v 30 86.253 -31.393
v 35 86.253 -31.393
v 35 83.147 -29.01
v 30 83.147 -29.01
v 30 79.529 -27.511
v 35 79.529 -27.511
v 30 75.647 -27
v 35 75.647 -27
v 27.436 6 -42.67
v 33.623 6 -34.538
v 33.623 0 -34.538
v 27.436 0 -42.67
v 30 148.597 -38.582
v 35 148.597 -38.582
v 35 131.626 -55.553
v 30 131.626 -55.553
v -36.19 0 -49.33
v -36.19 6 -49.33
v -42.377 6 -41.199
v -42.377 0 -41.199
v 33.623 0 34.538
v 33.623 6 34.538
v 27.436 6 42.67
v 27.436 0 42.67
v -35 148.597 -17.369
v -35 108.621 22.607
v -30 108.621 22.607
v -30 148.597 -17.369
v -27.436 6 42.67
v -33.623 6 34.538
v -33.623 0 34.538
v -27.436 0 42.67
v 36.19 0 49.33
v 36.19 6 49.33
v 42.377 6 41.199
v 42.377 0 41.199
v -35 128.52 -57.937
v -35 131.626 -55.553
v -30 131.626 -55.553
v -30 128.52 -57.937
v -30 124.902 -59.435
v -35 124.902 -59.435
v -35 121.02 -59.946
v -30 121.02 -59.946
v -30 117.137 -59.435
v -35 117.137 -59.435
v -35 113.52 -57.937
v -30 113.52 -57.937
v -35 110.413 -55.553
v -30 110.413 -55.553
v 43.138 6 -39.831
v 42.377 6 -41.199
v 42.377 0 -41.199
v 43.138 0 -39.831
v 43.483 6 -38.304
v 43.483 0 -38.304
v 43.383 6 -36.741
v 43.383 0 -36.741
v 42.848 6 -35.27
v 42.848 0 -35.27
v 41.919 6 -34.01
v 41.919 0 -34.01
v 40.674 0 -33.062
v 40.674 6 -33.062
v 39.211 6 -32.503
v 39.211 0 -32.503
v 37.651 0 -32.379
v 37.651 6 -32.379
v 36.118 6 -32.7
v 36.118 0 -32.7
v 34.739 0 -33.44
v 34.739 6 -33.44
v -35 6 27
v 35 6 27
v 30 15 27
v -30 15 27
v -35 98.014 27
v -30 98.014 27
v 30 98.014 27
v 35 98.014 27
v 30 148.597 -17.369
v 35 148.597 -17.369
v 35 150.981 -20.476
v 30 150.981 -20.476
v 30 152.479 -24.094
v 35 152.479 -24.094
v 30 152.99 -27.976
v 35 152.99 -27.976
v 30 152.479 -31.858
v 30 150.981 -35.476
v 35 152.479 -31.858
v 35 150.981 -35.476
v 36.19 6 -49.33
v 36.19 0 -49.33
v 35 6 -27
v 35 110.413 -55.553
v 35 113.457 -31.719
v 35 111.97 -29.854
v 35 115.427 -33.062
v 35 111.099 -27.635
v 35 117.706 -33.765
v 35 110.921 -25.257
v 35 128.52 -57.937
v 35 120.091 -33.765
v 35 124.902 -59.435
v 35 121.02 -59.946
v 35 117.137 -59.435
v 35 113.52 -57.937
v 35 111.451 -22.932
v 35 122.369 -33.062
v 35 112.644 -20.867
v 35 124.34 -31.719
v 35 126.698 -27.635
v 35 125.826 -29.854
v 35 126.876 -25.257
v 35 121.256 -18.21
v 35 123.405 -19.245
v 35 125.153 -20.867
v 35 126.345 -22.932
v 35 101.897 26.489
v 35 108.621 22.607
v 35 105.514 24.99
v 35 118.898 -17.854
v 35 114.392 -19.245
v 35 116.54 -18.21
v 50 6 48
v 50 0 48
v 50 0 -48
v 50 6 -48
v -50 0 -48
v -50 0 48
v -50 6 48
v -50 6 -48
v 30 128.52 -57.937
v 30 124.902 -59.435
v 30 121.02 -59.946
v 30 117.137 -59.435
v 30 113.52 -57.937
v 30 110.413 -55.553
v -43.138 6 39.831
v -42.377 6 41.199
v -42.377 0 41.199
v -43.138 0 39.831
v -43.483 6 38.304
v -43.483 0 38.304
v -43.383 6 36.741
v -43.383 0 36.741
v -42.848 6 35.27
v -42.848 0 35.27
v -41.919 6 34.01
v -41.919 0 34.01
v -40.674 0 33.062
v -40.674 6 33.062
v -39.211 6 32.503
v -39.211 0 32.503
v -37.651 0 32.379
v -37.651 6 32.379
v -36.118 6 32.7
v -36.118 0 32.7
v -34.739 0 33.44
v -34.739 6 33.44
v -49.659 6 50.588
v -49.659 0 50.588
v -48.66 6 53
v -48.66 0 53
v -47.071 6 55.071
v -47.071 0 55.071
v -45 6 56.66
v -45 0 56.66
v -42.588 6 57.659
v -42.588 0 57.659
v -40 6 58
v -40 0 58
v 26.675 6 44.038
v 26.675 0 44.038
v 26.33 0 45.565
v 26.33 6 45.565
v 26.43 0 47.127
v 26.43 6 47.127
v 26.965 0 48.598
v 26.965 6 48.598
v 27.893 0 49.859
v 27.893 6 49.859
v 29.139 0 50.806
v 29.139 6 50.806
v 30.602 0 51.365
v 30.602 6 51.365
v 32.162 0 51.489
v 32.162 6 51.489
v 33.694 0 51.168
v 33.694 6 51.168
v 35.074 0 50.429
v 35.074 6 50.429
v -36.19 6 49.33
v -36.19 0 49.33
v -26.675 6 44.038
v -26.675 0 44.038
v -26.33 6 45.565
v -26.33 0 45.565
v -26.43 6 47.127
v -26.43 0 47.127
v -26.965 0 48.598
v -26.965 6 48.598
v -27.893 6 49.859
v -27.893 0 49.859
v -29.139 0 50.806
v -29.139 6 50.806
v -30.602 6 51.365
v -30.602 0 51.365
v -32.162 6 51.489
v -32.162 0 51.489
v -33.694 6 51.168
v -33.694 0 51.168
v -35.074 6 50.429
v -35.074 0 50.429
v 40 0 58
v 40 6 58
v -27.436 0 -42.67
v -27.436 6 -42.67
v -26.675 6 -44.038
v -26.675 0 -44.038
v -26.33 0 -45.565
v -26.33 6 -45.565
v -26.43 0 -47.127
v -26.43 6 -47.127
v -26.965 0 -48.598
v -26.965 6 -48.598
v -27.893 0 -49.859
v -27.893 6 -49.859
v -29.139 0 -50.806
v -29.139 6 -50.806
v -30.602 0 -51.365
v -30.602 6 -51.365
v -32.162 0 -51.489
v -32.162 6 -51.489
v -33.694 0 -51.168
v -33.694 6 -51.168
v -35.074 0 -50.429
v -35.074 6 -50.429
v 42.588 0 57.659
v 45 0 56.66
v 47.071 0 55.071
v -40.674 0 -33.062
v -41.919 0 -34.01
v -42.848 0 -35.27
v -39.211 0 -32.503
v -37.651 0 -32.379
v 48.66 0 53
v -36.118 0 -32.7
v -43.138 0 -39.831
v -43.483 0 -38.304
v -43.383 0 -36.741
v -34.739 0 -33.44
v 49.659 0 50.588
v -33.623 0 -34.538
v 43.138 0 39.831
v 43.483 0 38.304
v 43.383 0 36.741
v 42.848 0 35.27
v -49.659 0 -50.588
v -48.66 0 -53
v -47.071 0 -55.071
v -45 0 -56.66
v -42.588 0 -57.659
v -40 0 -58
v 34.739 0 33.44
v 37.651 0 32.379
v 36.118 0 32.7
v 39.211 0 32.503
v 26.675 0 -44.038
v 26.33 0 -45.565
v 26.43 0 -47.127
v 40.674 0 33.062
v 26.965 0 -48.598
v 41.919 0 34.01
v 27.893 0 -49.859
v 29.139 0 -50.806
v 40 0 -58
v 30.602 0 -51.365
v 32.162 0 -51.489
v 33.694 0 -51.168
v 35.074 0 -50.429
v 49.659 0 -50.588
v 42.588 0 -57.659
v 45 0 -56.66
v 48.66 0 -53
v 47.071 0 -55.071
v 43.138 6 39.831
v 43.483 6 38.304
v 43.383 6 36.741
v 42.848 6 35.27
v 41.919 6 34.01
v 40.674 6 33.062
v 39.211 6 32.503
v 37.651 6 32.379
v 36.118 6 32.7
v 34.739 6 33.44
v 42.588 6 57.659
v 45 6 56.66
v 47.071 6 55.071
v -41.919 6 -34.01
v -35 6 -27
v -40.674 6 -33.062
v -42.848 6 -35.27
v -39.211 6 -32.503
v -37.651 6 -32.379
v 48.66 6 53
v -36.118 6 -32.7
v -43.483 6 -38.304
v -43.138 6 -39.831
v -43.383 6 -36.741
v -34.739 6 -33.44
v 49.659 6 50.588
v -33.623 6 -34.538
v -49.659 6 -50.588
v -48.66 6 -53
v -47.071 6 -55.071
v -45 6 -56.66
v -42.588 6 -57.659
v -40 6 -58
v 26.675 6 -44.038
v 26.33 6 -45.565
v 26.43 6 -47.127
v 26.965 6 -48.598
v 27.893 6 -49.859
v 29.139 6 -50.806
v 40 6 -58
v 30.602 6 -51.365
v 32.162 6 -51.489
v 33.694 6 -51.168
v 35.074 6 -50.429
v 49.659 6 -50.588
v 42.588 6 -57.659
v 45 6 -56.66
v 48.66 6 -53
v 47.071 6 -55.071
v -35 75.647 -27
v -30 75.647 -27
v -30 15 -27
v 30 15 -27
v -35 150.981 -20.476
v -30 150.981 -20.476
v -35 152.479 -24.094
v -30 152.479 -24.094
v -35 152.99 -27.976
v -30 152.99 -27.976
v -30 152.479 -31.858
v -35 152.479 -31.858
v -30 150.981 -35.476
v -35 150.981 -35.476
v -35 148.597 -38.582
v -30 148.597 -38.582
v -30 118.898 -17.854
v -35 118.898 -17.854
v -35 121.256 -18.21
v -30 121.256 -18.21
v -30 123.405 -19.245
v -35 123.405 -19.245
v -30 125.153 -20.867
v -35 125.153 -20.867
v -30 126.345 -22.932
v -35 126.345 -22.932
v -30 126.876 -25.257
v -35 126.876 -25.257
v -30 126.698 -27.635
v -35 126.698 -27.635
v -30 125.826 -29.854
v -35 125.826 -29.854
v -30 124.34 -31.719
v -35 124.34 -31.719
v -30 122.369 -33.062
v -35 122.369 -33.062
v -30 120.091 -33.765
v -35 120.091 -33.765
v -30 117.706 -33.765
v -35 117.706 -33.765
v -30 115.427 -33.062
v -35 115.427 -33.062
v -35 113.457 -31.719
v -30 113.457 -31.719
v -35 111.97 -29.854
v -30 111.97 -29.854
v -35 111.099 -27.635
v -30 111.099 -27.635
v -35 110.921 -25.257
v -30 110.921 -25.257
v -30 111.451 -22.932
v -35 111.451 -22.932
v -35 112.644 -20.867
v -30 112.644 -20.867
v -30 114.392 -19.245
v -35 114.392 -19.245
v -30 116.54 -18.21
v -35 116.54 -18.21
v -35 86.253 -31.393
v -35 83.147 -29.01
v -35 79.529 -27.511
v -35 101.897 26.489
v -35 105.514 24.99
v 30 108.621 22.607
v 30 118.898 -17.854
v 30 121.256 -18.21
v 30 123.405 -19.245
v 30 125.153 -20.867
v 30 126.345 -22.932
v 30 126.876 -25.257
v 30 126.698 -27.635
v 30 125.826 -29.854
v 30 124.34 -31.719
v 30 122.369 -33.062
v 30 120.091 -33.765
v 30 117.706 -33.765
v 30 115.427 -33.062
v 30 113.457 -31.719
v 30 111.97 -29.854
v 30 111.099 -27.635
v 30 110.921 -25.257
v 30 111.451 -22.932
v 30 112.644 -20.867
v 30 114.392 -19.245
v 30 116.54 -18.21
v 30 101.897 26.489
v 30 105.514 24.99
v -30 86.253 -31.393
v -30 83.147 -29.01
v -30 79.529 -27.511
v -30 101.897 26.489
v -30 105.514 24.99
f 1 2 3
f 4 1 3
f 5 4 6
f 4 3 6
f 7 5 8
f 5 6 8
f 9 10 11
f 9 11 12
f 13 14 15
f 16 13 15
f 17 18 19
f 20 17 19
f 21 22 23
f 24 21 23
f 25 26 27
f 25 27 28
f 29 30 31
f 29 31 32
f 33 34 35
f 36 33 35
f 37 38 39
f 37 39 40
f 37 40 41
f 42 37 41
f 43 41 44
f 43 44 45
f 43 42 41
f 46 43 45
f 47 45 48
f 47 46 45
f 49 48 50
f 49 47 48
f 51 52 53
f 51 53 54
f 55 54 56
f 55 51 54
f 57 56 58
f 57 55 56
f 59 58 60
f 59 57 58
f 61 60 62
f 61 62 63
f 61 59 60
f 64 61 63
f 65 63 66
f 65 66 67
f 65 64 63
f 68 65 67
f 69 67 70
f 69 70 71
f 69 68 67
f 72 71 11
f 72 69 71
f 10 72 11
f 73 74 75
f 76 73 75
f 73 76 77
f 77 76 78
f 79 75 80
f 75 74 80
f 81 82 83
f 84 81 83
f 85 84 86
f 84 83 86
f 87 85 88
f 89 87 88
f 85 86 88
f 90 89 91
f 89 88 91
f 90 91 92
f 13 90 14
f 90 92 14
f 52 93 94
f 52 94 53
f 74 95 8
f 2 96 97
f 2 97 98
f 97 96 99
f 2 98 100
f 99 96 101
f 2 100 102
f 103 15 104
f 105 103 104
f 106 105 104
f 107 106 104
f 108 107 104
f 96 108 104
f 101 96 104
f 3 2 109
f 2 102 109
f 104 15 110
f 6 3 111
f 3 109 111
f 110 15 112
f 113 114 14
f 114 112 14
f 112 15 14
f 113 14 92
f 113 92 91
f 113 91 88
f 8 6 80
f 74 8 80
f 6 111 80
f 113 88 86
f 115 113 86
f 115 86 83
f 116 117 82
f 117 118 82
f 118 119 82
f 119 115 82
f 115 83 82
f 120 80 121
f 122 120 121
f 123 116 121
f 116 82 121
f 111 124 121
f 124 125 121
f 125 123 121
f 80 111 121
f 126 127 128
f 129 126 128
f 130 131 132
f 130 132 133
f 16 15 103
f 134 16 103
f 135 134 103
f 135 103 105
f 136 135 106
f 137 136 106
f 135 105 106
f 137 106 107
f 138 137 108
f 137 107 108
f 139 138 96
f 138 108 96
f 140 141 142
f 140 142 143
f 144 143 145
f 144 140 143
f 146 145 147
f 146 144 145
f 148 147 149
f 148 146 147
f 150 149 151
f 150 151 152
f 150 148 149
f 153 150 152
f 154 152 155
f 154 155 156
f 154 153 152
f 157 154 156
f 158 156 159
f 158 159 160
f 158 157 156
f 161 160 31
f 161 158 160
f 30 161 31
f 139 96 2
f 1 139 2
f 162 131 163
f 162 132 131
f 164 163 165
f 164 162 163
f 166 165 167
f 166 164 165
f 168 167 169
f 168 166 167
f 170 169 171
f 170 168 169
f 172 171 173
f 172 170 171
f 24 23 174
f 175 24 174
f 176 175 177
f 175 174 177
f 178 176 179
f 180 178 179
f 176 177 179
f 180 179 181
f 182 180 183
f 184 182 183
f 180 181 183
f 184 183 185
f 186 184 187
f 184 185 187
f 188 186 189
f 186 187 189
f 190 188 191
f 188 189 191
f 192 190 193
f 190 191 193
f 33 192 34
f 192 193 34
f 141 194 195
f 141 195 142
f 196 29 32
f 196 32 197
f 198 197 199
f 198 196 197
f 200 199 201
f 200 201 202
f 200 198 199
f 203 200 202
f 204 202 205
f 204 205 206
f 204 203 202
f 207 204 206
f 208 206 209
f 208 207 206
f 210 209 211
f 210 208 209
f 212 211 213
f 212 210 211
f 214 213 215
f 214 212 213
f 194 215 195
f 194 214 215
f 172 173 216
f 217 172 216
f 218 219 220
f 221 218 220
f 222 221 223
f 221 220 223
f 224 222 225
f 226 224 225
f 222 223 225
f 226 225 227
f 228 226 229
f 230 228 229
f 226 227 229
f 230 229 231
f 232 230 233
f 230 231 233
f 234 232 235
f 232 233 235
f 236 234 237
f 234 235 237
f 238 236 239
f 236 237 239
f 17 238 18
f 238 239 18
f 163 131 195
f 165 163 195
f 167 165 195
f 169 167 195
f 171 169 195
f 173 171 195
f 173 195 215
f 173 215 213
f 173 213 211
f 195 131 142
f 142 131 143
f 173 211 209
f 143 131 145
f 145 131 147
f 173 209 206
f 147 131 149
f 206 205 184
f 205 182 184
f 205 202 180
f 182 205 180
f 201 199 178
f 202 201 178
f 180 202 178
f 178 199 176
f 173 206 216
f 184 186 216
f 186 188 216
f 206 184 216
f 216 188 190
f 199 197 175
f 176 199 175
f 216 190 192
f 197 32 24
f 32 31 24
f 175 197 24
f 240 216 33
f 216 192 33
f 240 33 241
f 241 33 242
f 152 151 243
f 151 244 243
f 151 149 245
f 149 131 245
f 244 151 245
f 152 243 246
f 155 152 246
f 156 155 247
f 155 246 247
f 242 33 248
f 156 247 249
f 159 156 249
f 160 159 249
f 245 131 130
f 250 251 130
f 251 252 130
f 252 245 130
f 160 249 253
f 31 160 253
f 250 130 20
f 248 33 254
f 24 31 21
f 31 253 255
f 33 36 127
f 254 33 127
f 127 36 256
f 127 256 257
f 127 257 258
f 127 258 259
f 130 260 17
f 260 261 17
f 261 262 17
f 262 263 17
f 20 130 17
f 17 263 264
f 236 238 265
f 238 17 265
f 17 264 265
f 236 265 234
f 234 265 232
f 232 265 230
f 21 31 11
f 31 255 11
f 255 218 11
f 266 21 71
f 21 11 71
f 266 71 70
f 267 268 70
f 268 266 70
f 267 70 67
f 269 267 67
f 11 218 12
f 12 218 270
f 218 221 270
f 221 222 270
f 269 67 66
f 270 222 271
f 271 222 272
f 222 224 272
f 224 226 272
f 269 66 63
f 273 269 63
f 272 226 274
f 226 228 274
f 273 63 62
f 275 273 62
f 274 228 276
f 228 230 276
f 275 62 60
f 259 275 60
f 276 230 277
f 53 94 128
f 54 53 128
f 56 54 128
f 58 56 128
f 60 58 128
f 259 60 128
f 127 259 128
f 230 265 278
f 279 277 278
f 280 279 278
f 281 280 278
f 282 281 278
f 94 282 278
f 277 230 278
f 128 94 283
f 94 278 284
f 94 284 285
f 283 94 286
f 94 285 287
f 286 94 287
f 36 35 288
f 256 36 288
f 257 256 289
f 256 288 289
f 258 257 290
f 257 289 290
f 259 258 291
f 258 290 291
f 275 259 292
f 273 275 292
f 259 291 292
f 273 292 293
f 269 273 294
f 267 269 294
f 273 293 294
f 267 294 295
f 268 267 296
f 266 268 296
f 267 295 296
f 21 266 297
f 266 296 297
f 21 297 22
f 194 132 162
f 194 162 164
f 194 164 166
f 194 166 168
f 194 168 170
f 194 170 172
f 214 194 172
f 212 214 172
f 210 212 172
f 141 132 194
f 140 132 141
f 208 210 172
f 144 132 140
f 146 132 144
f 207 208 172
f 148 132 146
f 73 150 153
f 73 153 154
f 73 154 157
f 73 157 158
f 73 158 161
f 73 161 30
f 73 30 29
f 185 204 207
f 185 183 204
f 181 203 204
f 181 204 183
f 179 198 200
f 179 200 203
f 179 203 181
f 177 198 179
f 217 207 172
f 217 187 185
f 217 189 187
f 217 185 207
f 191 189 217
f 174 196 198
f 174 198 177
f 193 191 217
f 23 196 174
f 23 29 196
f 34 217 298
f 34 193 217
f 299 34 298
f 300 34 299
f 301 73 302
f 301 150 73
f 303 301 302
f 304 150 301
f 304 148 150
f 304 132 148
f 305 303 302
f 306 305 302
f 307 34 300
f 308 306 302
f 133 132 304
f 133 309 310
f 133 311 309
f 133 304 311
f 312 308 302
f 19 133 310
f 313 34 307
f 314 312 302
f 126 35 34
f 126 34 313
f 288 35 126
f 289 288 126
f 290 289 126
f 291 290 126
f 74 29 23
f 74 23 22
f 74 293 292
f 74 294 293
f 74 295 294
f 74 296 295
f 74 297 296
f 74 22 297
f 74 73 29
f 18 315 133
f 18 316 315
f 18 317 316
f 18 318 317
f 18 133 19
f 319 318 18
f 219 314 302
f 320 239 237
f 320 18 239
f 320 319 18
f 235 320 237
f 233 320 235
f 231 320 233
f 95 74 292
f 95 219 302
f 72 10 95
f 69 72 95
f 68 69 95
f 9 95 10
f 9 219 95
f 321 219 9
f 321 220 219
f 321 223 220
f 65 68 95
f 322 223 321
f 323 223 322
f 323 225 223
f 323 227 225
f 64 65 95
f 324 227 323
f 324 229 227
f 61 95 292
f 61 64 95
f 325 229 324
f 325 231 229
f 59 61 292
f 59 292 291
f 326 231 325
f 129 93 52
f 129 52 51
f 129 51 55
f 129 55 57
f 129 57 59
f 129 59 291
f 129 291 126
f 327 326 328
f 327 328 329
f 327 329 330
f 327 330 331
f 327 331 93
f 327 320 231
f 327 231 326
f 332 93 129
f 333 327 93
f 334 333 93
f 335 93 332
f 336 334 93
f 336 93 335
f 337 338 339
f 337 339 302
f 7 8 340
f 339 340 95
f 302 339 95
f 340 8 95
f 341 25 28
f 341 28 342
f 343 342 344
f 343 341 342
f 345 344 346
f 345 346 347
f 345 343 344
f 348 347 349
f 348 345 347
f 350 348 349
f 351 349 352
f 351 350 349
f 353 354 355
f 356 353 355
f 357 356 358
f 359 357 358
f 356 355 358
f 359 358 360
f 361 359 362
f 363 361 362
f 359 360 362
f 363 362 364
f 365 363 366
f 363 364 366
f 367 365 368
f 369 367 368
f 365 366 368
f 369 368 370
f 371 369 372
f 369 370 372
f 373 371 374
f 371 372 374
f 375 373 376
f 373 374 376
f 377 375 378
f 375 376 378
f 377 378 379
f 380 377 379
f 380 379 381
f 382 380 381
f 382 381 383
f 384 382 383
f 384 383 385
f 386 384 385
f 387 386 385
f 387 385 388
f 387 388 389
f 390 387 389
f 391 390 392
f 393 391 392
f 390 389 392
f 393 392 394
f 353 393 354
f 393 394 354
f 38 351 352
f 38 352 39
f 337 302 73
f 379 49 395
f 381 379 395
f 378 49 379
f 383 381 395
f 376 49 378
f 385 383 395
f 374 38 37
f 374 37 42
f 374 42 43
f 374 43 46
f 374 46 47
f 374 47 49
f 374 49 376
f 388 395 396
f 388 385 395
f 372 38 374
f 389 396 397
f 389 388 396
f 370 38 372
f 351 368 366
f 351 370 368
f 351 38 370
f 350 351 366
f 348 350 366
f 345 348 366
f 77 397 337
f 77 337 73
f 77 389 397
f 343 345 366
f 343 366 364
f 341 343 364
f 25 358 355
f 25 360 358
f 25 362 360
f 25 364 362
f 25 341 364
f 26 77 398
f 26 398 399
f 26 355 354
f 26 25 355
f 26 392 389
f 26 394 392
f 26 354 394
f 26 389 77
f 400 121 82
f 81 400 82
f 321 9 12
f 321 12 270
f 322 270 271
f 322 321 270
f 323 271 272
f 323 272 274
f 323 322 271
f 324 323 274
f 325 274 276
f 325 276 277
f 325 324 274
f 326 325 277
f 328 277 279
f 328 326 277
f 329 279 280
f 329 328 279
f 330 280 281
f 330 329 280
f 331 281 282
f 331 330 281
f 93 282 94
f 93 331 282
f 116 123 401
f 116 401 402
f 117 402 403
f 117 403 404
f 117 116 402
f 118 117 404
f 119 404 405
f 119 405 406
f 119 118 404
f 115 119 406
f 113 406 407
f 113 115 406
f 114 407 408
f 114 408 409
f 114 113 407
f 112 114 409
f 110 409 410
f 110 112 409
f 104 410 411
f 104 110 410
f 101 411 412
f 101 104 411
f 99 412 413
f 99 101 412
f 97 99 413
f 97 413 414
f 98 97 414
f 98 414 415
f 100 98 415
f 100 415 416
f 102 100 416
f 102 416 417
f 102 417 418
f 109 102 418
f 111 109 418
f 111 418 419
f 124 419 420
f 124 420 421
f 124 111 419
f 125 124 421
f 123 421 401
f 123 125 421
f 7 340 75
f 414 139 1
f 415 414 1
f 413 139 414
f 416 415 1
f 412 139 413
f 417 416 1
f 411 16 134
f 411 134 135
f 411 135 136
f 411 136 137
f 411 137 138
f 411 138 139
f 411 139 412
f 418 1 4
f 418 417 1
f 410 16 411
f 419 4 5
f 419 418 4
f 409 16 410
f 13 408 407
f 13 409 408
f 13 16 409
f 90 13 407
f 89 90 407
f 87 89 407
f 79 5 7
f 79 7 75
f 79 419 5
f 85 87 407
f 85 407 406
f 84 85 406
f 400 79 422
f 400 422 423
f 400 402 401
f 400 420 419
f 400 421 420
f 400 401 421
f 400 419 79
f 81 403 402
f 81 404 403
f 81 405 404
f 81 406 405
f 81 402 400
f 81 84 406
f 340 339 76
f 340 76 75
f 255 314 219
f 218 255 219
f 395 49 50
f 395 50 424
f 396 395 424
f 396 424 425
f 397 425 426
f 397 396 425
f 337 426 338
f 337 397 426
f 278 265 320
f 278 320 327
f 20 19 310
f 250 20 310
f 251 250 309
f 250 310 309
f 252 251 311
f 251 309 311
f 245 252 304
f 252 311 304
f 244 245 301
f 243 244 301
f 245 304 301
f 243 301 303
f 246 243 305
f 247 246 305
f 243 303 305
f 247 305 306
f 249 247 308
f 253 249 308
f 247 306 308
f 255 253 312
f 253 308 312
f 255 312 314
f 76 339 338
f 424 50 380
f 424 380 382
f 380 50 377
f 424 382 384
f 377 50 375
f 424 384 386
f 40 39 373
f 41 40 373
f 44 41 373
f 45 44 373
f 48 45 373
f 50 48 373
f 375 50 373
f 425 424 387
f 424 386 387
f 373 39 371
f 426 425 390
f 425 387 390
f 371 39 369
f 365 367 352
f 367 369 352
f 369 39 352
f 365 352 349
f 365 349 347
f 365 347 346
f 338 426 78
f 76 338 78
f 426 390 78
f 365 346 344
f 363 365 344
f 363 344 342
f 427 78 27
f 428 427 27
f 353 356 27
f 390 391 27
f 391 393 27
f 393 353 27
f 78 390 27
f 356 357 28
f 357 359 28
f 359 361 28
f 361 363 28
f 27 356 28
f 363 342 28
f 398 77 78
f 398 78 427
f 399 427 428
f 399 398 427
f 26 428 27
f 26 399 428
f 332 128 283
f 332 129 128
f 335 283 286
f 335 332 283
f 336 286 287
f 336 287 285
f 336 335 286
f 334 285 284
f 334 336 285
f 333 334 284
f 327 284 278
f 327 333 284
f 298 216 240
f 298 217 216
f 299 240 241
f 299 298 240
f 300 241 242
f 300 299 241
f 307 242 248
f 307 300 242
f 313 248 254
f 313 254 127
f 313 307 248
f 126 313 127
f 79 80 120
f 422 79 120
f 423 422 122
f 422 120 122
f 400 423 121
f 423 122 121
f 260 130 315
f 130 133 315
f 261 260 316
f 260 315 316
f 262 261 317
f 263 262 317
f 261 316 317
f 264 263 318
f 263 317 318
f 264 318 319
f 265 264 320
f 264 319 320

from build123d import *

# Parameters (mm, degrees)
SKETCH1_W           = 100
SKETCH1_H           = 116
BOSS_EXTRUDE1_DEPTH = 6
FILLET1_R           = 10
CUT_EXTRUDE1_DEPTH  = 6
SKETCH3_W           = 70
SKETCH3_H           = 54
BOSS_EXTRUDE2_DEPTH = 9
SKETCH5_R           = 8
BOSS_EXTRUDE3_DEPTH = 5


with BuildPart() as part:
    # Sketch1 → Boss-Extrude1 (new body)
    with BuildSketch(Plane(origin=(0, 0, 0), x_dir=(1, 0, 0), z_dir=(0, 1, 0))):
        Rectangle(SKETCH1_W, SKETCH1_H)
    extrude(amount=BOSS_EXTRUDE1_DEPTH)

    # Fillet1
    fillet1_edges = [part.edges().sort_by_distance(p)[0] for p in [
        (-50, 3, -58),
        (50, 3, -58),
        (50, 3, 58),
        (-50, 3, 58),
    ]]
    fillet(fillet1_edges, radius=FILLET1_R)

    # Sketch2 → Cut-Extrude1 (cut)
    with BuildSketch(Plane(origin=(0, 6, 0), x_dir=(1, 0, 0), z_dir=(0, 1, 0))):
        with BuildLine():
            Line((-36.189873482, 49.330370079), (-42.377057818, 41.198642095))
            ThreePointArc((-42.377057818, 41.198642095), (-41.330370079, 33.491214199), (-33.622942182, 34.537901938))
            Line((-33.622942182, 34.537901938), (-27.435757847, 42.669629921))
            ThreePointArc((-27.435757847, 42.669629921), (-28.482445586, 50.377057818), (-36.189873482, 49.330370079))
        make_face()
        with BuildLine():
            Line((36.189873482, 49.330370079), (42.377057818, 41.198642095))
            ThreePointArc((42.377057818, 41.198642095), (41.330370079, 33.491214199), (33.622942182, 34.537901938))
            Line((33.622942182, 34.537901938), (27.435757847, 42.669629921))
            ThreePointArc((27.435757847, 42.669629921), (28.482445586, 50.377057818), (36.189873482, 49.330370079))
        make_face()
        with BuildLine():
            Line((-36.189873482, -49.330370079), (-42.377057818, -41.198642095))
            ThreePointArc((-42.377057818, -41.198642095), (-41.330370079, -33.491214199), (-33.622942182, -34.537901938))
            Line((-33.622942182, -34.537901938), (-27.435757847, -42.669629921))
            ThreePointArc((-27.435757847, -42.669629921), (-28.482445586, -50.377057818), (-36.189873482, -49.330370079))
        make_face()
        with BuildLine():
            Line((36.189873482, -49.330370079), (42.377057818, -41.198642095))
            ThreePointArc((42.377057818, -41.198642095), (41.330370079, -33.491214199), (33.622942182, -34.537901938))
            Line((33.622942182, -34.537901938), (27.435757847, -42.669629921))
            ThreePointArc((27.435757847, -42.669629921), (28.482445586, -50.377057818), (36.189873482, -49.330370079))
        make_face()
    extrude(amount=-CUT_EXTRUDE1_DEPTH, mode=Mode.SUBTRACT)

    # Sketch3 → Boss-Extrude2 (add)
    with BuildSketch(Plane(origin=(0, 6, 0), x_dir=(1, 0, 0), z_dir=(0, 1, 0))):
        Rectangle(SKETCH3_W, SKETCH3_H)
    extrude(amount=BOSS_EXTRUDE2_DEPTH)

    # Sketch5 → Boss-Extrude3 (add)
    with BuildSketch(Plane.ZY.offset(35)):
        with BuildLine():
            Line((-27, 15), (27, 15))
            Line((27, 15), (27, 98.014328933))
            ThreePointArc((27, 98.014328933), (25.858192988, 103.754580418), (22.606601718, 108.62093065))
            Line((22.606601718, 108.62093065), (-17.36920564, 148.596738008))
            ThreePointArc((-17.36920564, 148.596738008), (-27.975807358, 152.990136291), (-38.582409076, 148.596738008))
            Line((-38.582409076, 148.596738008), (-55.552971824, 131.62617526))
            ThreePointArc((-55.552971824, 131.62617526), (-59.946370107, 121.019573542), (-55.552971824, 110.412971824))
            Line((-55.552971824, 110.412971824), (-31.393398282, 86.253398282))
            ThreePointArc((-31.393398282, 86.253398282), (-28.141807012, 81.38704805), (-27, 75.646796564))
            Line((-27, 75.646796564), (-27, 15))
        make_face()
        with Locations((-25.854487014, 118.898253199)):
            Circle(SKETCH5_R, mode=Mode.SUBTRACT)
    boss_extrude3 = extrude(amount=-BOSS_EXTRUDE3_DEPTH)

    # Mirror1: Boss-Extrude3 across plane
    add(boss_extrude3.mirror(Plane(origin=(0, 0, 0), x_dir=(0, 0, 1), z_dir=(1, 0, 0))))


solid = part.part
